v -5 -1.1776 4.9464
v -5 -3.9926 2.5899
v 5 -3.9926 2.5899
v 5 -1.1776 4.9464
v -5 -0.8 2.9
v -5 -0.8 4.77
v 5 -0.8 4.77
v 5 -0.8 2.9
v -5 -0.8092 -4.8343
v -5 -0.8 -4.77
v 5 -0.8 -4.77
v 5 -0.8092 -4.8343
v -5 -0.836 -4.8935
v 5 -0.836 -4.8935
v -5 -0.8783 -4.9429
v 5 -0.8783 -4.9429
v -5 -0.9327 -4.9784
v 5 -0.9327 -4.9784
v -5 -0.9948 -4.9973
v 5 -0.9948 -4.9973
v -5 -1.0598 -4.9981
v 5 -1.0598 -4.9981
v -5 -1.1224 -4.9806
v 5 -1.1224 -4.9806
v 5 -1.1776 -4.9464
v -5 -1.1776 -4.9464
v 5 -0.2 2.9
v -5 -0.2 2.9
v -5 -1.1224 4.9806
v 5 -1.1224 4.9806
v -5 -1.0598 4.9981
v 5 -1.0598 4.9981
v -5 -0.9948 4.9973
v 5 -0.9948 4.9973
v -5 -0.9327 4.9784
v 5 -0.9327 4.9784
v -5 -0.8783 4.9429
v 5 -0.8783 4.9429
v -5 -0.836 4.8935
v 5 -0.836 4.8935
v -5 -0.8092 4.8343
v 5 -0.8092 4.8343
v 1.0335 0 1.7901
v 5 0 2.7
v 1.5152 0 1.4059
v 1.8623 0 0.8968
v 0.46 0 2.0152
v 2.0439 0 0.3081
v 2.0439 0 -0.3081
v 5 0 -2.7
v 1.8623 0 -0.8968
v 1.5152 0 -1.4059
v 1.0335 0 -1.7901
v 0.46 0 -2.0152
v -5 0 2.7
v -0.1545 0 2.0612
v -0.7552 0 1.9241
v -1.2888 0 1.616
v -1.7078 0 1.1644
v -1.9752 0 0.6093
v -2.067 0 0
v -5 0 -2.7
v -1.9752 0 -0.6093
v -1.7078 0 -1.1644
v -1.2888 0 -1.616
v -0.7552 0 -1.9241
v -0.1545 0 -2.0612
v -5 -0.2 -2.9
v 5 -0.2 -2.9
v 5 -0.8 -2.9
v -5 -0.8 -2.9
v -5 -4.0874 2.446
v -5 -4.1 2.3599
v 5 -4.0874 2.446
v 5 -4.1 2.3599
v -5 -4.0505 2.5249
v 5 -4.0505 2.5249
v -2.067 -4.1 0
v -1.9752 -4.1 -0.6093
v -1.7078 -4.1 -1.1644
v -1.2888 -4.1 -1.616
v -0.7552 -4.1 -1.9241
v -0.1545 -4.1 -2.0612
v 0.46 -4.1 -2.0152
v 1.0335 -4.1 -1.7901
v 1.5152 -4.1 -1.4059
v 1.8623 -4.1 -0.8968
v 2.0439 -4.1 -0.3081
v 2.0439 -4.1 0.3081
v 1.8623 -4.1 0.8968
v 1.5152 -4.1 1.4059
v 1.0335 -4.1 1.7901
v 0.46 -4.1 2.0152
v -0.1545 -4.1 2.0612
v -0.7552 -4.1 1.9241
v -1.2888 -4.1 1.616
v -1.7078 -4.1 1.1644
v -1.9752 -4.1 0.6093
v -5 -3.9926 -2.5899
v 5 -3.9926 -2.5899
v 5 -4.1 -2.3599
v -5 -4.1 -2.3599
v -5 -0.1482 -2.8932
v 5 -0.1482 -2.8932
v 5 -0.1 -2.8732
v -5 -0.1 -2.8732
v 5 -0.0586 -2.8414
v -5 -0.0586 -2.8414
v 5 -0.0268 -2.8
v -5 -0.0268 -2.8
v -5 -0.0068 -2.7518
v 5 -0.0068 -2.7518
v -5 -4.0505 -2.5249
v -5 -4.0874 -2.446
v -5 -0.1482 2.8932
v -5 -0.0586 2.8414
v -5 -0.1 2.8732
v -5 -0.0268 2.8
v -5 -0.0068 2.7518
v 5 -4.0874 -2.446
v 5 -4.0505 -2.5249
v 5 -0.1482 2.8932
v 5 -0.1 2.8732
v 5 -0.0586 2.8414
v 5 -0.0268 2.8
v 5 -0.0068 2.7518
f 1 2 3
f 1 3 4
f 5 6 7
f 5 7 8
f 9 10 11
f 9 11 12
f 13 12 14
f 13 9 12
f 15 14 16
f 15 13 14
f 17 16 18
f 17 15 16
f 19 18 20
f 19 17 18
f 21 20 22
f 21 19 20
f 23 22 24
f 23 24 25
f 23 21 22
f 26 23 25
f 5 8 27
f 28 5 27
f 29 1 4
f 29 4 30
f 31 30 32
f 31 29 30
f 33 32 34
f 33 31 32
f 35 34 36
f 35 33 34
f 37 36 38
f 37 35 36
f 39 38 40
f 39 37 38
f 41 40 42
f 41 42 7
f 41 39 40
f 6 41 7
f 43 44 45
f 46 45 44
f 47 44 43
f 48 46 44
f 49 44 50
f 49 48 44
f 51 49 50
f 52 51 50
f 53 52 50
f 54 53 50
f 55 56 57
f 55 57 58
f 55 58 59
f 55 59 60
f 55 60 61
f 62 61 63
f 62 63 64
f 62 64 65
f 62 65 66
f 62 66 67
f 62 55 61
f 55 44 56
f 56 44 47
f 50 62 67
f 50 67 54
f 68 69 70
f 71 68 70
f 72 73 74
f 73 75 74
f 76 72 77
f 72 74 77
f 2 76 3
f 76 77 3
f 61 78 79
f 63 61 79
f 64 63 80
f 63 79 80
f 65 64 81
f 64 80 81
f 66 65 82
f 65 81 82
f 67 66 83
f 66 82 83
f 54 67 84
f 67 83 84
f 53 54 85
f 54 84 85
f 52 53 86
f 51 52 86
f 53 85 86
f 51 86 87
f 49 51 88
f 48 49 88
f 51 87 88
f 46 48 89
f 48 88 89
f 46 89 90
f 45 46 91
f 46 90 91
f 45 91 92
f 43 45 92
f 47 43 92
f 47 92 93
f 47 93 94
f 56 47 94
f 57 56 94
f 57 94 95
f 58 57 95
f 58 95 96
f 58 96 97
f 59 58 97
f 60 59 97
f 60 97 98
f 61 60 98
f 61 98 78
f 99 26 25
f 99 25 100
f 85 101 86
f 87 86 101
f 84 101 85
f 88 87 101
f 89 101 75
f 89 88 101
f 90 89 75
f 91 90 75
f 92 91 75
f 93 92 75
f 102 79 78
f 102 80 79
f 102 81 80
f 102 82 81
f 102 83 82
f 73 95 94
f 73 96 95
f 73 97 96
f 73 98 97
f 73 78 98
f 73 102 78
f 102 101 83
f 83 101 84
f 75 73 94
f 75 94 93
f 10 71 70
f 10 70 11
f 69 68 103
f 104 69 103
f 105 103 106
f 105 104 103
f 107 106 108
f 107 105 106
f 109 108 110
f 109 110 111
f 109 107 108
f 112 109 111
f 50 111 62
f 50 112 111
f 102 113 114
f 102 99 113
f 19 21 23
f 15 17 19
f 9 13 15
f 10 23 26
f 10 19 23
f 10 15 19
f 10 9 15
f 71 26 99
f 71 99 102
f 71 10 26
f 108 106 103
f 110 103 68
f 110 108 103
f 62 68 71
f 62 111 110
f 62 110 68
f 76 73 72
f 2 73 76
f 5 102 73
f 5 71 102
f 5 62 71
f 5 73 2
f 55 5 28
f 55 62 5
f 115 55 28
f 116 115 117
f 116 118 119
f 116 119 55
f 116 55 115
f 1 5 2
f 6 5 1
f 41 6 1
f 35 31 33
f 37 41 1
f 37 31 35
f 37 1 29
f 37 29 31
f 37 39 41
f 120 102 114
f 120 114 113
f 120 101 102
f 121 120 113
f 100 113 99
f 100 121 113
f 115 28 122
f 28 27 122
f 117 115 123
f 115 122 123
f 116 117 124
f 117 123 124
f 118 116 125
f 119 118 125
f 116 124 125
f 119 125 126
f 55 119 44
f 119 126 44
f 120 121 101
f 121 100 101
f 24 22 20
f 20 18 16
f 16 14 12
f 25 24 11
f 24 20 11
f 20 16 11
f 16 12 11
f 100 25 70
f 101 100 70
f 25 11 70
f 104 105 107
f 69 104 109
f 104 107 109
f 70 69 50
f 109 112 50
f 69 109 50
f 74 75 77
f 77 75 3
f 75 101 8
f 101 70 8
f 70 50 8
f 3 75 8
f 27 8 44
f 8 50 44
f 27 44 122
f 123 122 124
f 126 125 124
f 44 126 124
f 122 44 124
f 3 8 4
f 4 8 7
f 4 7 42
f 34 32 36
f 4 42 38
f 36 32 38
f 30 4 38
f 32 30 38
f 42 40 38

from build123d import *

# Parameters (mm, degrees)
BOSS_EXTRUDE1_DEPTH = 10
FILLET1_R           = 0.3
FILLET2_R           = 0.2
TAPPED_HOLE1_D      = 4.134


with BuildPart() as part:
    # Sketch1 → Boss-Extrude1 (new body)
    with BuildSketch(Plane(origin=(-5, 0, 0), x_dir=(0, 0, -1), z_dir=(1, 0, 0))):
        with BuildLine():
            Line((2.5, -4.1), (-2.5, -4.1))
            Line((-2.5, -4.1), (-4.94636223, -1.177635916))
            ThreePointArc((-4.94636223, -1.177635916), (-4.978394171, -0.932676469), (-4.77, -0.8))
            Line((-4.77, -0.8), (-2.9, -0.8))
            Line((-2.9, -0.8), (-2.9, 0))
            Line((-2.9, 0), (2.9, 0))
            Line((2.9, 0), (2.9, -0.8))
            Line((2.9, -0.8), (4.77, -0.8))
            ThreePointArc((4.77, -0.8), (4.978394171, -0.932676469), (4.94636223, -1.177635916))
            Line((4.94636223, -1.177635916), (2.5, -4.1))
        make_face()
    extrude(amount=BOSS_EXTRUDE1_DEPTH)

    # Fillet1
    fillet1_edges = [part.edges().sort_by_distance(p)[0] for p in [
        (0, -4.1, -2.5),
        (0, -4.1, 2.5),
    ]]
    fillet(fillet1_edges, radius=FILLET1_R)

    # Fillet2
    fillet2_edges = [part.edges().sort_by_distance(p)[0] for p in [
        (0, 0, 2.9),
        (0, 0, -2.9),
    ]]
    fillet(fillet2_edges, radius=FILLET2_R)

    # Tapped Hole1 (through all)
    with Locations(Plane(origin=(0, 0, 0), x_dir=(1, 0, 0), z_dir=(0, 1, 0))):
        with Locations((0, 0)):
            Hole(TAPPED_HOLE1_D / 2)


solid = part.part
